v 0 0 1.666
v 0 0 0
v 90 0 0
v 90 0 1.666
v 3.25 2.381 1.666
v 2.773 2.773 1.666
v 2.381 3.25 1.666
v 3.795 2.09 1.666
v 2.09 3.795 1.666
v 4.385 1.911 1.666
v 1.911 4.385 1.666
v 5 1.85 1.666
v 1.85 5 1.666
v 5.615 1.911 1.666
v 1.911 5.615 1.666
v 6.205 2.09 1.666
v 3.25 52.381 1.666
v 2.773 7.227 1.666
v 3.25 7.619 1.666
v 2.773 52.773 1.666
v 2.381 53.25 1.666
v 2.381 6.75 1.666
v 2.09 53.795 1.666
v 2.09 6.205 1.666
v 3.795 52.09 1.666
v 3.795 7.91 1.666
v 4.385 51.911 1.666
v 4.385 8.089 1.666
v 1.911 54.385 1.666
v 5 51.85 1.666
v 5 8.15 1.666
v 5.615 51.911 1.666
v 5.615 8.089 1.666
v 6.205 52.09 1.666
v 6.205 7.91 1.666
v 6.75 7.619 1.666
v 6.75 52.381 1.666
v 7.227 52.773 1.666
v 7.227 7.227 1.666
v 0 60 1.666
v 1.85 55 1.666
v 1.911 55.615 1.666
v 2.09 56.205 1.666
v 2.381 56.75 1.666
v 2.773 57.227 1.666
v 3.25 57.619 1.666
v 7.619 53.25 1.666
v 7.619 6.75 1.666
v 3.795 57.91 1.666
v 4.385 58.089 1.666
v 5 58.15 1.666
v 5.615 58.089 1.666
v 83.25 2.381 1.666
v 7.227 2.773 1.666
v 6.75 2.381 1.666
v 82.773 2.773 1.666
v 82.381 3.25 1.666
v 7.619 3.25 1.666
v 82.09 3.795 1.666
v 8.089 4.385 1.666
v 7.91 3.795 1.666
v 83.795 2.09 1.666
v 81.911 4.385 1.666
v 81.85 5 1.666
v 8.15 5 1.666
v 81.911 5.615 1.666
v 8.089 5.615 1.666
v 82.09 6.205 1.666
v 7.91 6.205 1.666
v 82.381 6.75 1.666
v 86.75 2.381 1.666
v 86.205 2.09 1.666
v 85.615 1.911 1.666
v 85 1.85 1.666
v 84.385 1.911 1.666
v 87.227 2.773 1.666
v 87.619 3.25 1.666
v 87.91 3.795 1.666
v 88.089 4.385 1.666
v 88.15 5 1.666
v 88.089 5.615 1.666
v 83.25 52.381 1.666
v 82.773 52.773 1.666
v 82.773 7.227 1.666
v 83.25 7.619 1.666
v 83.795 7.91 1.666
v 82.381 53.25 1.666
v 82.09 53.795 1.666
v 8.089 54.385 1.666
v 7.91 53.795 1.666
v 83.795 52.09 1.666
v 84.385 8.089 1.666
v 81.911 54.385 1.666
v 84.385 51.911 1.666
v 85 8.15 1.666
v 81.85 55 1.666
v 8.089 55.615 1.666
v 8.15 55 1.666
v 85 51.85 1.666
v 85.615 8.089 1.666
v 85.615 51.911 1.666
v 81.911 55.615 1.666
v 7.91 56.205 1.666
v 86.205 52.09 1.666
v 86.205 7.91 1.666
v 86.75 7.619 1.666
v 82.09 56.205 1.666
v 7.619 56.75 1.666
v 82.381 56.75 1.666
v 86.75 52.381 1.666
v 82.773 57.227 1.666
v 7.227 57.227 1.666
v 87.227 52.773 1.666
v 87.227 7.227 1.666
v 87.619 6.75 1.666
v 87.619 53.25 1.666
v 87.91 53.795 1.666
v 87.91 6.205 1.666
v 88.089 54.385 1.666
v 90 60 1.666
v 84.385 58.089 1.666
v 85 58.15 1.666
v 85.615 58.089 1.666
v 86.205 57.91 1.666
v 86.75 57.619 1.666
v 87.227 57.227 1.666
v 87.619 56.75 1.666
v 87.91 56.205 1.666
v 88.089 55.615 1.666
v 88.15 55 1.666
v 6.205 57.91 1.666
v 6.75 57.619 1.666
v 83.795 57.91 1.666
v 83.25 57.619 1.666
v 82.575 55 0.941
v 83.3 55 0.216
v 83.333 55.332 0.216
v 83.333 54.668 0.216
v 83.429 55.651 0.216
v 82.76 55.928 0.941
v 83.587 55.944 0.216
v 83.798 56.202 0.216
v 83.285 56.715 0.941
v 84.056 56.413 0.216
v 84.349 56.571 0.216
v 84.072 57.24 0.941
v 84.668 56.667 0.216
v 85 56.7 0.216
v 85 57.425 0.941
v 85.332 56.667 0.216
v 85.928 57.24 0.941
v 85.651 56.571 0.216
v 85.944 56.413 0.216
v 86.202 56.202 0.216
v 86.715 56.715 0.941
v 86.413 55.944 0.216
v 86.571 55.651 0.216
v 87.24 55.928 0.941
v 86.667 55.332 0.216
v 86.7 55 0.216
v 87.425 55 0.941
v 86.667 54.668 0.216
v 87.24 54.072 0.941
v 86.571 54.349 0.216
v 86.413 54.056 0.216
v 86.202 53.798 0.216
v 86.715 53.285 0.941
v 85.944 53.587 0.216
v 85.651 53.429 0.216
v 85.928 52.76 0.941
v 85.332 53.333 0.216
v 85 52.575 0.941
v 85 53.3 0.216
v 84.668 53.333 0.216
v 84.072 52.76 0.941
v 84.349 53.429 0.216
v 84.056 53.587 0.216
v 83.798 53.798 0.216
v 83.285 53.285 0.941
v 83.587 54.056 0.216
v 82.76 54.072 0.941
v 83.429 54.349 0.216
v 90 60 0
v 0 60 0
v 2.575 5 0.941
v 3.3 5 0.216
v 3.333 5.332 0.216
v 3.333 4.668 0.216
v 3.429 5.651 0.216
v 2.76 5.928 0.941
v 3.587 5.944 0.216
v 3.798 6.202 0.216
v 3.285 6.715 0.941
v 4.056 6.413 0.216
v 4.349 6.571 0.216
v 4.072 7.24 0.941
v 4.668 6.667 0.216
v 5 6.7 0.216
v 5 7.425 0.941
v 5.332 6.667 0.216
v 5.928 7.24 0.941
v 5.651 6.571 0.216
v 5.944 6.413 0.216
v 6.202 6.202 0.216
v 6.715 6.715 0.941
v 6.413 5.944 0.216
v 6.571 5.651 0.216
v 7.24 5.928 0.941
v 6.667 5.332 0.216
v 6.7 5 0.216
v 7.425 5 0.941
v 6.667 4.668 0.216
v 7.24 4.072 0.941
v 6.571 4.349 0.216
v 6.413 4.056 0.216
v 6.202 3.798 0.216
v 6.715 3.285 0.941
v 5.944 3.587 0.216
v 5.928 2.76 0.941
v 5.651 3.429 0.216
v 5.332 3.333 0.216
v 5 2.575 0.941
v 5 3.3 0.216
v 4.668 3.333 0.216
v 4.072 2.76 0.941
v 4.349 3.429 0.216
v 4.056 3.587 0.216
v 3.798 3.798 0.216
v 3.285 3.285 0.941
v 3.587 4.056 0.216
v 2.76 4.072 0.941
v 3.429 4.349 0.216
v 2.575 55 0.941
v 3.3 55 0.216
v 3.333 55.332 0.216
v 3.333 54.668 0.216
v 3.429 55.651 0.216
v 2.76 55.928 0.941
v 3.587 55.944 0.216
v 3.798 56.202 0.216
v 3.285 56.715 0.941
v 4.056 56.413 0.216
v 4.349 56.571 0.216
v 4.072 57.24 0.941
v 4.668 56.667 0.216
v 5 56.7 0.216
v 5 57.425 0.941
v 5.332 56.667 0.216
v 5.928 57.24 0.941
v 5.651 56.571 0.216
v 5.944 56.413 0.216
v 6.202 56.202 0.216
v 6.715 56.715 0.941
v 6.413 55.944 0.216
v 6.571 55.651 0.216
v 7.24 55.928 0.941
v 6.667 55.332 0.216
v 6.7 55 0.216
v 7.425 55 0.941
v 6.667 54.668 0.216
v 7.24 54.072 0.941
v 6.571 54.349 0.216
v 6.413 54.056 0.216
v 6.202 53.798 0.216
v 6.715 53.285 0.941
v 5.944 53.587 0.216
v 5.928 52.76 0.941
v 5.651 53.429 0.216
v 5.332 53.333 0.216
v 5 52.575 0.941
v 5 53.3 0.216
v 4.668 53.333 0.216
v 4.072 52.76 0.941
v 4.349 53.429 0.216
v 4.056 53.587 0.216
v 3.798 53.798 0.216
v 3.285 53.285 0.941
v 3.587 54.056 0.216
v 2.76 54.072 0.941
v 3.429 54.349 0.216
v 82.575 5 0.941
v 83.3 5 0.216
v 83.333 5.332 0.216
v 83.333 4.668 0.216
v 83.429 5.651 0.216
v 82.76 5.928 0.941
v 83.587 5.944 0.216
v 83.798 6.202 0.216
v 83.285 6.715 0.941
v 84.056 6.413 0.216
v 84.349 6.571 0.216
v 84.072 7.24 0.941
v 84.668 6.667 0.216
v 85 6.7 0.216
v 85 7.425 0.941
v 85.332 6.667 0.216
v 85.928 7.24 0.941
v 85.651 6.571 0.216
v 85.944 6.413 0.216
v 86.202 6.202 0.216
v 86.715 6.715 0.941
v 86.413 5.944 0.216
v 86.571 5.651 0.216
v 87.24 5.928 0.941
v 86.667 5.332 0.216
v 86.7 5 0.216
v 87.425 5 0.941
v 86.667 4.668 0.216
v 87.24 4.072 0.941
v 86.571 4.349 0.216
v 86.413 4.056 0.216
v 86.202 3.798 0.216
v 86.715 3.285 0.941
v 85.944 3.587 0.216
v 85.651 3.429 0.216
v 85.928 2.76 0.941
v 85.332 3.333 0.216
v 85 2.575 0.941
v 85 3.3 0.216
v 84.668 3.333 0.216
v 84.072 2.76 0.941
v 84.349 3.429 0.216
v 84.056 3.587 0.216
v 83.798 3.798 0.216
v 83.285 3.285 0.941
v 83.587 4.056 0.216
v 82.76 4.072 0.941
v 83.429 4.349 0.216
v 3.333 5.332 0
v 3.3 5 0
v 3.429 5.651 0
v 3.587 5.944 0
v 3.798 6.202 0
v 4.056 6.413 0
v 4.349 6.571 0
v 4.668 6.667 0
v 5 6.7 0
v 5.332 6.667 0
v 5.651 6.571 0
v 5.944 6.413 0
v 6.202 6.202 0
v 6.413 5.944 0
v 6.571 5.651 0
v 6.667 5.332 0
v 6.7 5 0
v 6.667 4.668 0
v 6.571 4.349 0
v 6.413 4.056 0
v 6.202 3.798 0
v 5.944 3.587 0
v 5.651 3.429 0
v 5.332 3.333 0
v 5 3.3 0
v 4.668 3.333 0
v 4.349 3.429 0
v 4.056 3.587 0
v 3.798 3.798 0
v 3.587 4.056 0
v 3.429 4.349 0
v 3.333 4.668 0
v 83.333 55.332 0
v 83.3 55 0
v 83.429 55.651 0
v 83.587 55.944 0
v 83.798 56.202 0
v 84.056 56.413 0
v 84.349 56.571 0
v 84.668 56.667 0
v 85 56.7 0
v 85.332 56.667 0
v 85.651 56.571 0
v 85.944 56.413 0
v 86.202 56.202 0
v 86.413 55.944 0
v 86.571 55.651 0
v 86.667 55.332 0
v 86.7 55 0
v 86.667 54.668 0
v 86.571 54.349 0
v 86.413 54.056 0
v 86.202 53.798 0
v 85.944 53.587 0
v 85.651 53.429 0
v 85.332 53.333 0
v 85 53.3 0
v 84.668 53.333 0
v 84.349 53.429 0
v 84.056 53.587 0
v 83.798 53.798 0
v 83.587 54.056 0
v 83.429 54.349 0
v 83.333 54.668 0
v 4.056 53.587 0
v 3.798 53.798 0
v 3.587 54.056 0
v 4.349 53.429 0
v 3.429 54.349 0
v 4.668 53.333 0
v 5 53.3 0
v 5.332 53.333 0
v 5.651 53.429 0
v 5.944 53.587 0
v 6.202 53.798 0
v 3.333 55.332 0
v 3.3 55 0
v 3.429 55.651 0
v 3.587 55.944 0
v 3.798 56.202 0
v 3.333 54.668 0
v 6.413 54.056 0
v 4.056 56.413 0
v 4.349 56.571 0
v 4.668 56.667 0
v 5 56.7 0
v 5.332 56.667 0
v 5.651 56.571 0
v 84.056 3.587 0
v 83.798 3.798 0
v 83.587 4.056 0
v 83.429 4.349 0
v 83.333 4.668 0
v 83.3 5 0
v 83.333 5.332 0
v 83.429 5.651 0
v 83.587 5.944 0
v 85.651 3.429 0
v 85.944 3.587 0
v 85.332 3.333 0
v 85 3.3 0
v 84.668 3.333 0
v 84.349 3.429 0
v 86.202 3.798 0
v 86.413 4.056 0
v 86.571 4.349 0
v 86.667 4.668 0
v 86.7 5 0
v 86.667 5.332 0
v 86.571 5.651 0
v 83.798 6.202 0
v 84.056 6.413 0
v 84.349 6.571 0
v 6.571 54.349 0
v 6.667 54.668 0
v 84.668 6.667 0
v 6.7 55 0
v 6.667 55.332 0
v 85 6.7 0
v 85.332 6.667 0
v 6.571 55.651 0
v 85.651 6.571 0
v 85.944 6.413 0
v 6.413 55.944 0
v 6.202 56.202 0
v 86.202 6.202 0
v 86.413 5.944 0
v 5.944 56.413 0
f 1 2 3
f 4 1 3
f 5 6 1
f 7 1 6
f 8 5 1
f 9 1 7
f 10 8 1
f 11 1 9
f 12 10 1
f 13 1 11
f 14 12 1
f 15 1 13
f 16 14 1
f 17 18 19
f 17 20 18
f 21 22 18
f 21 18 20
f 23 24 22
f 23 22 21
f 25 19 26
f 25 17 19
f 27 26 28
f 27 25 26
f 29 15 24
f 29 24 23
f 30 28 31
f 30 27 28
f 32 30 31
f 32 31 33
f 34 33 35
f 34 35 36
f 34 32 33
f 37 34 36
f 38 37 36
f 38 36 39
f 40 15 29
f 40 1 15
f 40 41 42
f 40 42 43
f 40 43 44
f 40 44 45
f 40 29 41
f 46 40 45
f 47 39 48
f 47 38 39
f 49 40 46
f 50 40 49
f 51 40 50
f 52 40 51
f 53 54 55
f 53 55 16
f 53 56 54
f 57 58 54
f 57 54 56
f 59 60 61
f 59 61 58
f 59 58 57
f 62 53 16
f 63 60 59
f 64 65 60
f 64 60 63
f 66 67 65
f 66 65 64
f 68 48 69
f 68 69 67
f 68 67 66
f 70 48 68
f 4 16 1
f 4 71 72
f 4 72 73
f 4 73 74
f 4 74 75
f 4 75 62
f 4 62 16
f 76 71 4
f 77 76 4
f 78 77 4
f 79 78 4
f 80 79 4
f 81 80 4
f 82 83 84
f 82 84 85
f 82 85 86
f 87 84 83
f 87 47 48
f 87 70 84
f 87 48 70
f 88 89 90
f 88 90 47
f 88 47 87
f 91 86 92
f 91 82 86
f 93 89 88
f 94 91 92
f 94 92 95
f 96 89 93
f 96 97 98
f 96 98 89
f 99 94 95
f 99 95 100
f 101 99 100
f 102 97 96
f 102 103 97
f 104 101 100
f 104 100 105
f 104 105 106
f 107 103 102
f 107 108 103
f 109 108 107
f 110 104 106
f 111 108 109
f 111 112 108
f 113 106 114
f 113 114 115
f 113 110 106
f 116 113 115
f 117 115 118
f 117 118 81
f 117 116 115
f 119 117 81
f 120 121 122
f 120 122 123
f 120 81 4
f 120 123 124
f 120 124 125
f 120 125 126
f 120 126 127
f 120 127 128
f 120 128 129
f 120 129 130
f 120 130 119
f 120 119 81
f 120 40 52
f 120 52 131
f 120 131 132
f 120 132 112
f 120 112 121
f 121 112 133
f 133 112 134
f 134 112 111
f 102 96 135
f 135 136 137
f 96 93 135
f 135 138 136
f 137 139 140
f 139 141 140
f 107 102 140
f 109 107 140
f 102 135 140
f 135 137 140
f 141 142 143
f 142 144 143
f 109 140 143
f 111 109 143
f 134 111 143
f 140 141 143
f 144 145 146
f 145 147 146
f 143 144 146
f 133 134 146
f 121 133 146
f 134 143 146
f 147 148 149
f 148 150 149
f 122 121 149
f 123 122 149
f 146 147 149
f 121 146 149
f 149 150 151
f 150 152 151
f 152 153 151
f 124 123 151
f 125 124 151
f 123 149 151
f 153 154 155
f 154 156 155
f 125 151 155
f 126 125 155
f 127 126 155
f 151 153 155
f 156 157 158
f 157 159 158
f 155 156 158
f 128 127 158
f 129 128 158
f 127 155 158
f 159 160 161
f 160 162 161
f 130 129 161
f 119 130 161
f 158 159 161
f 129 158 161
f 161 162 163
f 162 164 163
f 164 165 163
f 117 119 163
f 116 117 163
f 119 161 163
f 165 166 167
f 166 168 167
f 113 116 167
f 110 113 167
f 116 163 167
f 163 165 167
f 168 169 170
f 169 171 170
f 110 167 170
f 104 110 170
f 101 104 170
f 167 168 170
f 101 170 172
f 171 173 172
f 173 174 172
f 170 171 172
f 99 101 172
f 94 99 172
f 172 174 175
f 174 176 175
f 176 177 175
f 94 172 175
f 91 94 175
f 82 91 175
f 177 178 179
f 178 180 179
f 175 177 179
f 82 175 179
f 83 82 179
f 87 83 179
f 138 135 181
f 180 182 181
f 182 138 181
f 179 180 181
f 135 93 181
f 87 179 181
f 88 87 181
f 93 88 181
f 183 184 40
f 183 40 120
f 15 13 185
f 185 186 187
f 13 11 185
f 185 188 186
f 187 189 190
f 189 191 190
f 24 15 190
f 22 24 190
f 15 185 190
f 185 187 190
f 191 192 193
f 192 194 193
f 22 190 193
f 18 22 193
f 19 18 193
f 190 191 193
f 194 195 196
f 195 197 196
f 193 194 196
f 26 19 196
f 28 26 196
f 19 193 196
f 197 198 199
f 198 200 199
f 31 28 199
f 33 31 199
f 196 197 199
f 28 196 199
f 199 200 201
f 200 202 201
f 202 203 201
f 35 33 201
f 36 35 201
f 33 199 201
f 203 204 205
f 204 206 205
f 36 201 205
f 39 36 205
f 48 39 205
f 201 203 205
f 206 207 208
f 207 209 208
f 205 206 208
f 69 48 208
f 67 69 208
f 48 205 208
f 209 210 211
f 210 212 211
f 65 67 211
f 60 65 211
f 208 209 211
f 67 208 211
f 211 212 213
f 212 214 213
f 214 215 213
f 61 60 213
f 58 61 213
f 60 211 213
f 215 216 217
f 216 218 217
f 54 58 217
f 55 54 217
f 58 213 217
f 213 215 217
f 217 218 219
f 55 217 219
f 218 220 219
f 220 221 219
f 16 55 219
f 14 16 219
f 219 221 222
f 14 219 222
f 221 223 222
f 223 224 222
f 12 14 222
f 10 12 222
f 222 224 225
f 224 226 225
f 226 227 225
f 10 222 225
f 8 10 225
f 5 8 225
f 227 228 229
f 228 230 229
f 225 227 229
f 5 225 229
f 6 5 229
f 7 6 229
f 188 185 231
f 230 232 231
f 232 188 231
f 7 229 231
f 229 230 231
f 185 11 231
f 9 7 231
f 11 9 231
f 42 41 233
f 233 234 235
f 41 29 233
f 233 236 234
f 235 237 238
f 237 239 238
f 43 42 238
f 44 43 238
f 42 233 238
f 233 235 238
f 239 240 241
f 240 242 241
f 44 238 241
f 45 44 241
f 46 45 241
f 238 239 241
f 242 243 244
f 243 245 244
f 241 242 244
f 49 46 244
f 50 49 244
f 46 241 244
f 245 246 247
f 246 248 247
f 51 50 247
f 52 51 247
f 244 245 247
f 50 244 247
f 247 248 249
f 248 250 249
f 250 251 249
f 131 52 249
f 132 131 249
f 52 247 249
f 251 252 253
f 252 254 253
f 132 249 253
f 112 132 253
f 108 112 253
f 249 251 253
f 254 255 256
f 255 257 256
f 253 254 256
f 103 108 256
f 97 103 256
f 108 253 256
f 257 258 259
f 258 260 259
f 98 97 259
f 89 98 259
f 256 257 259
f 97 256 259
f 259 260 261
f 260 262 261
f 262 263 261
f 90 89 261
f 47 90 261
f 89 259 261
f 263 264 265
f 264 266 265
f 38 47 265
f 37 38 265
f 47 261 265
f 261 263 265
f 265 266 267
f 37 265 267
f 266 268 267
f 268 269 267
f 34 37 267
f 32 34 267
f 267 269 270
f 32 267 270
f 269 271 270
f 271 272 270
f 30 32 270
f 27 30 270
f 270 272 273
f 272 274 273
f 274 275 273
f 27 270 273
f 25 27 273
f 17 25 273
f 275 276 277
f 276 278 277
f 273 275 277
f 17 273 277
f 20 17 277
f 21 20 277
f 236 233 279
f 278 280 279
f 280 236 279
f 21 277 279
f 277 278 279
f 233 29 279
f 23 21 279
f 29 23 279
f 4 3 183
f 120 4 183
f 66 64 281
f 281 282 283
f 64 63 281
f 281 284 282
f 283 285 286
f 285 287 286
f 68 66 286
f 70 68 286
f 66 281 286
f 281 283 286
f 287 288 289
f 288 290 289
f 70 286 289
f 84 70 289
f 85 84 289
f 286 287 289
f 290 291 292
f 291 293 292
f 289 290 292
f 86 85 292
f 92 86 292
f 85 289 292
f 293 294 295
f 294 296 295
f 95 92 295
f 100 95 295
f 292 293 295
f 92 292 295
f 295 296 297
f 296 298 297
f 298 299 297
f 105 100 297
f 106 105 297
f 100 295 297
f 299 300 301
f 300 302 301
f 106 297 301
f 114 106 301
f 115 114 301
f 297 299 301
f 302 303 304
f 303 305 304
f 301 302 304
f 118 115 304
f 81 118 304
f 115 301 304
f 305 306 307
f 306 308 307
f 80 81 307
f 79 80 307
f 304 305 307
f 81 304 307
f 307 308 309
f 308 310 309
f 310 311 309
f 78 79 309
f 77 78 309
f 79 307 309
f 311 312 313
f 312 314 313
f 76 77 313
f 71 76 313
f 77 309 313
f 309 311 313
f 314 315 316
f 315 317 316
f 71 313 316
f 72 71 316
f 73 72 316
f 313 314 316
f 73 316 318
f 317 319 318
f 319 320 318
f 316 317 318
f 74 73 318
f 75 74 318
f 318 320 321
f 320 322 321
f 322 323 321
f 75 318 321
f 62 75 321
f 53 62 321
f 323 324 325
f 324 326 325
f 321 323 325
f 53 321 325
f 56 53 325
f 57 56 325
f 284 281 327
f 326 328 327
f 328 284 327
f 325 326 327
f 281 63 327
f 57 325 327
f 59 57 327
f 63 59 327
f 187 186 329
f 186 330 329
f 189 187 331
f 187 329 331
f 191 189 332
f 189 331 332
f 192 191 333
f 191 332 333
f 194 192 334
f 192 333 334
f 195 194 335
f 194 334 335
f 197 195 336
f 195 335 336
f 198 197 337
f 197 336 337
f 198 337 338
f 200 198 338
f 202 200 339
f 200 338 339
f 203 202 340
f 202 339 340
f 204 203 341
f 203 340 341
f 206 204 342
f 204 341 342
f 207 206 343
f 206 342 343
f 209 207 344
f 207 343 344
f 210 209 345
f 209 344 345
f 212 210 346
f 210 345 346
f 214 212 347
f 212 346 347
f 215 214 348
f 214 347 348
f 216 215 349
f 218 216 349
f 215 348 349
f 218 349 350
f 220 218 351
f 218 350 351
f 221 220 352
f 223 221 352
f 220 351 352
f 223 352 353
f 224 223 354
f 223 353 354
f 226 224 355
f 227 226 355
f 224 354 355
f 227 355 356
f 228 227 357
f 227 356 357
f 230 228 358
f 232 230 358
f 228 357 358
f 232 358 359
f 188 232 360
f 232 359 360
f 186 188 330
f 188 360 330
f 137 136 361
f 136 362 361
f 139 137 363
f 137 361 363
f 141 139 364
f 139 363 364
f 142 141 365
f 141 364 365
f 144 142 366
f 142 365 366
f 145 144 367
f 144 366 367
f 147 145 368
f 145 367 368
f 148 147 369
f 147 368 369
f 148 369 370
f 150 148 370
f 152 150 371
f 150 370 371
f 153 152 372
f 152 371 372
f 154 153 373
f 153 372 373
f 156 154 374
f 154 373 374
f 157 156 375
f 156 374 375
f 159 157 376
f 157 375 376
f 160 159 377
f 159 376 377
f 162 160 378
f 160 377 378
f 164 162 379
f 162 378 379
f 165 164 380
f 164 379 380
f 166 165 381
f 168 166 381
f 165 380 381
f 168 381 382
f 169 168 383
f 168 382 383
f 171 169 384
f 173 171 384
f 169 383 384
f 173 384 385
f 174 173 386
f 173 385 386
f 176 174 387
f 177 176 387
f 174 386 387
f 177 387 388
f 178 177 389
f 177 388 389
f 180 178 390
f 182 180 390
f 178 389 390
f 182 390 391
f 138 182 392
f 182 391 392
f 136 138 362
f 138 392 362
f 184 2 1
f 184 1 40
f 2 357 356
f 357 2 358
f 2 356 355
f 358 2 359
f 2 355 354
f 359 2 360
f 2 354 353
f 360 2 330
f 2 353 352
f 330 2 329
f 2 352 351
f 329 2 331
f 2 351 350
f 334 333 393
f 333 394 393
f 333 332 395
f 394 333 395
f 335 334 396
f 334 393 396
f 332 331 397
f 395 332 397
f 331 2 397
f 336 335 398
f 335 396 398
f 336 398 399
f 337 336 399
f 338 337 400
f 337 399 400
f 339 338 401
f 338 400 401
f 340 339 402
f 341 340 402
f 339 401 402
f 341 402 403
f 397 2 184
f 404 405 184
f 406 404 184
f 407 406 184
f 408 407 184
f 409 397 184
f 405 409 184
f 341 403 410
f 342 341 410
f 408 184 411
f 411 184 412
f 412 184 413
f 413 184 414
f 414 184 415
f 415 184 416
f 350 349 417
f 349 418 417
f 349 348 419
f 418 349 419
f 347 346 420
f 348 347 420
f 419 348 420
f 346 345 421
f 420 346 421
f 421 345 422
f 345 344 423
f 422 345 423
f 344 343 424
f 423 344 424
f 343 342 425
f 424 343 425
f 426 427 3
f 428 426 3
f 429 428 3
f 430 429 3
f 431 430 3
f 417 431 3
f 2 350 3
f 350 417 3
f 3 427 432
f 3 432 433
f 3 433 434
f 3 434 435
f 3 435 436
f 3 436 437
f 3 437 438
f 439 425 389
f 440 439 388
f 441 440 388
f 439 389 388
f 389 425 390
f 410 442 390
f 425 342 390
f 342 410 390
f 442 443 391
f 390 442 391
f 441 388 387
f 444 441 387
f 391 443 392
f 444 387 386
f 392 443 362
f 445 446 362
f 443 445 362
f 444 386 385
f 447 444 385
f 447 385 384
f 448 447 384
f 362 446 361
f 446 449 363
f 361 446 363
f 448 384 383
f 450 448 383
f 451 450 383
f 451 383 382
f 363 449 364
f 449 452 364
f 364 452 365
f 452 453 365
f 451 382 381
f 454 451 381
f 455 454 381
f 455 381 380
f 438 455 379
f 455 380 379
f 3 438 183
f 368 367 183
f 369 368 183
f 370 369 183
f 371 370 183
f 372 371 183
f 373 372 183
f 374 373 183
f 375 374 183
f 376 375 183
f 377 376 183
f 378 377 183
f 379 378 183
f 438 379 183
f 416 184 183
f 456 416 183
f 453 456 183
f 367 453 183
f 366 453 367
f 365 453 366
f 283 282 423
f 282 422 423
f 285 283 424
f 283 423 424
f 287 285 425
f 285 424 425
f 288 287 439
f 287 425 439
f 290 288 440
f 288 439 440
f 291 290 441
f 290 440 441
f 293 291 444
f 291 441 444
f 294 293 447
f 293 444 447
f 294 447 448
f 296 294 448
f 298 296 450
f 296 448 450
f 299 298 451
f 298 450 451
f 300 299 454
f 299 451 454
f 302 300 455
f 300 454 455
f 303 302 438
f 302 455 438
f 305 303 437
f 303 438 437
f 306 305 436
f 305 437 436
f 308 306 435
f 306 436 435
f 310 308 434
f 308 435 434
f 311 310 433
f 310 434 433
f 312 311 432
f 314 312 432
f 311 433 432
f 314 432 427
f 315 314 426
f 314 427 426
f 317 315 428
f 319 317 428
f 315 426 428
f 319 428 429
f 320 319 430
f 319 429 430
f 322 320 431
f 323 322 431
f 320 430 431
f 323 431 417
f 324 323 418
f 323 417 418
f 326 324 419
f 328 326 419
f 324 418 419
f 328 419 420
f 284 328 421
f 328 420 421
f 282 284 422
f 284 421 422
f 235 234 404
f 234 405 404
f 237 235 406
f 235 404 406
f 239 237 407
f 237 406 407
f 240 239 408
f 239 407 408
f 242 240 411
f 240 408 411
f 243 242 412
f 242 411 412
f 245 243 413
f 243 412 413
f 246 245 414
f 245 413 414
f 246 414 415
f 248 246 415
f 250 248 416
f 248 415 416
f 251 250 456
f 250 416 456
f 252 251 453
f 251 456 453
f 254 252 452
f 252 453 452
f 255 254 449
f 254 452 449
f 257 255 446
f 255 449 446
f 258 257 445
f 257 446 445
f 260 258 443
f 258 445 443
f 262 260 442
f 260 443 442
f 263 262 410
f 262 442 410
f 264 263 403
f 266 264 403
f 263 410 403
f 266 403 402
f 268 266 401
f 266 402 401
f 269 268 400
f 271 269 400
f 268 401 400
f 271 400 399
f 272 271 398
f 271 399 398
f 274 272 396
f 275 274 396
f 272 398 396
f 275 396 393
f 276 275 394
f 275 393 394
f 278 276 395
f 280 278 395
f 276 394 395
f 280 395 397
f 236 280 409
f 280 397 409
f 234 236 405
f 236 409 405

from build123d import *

# Parameters (mm, degrees)
SKETCH1_W                                           = 90
SKETCH1_H                                           = 60
BOSS_EXTRUDE1_DEPTH                                 = 1.666
CSK_FOR_M3_COUNTERSUNK_FLAT_HEAD_SCREW1_D           = 3.4
CSK_FOR_M3_COUNTERSUNK_FLAT_HEAD_SCREW1_DEPTH       = 30
CSK_FOR_M3_COUNTERSUNK_FLAT_HEAD_SCREW1_CSINK_D     = 6.3
CSK_FOR_M3_COUNTERSUNK_FLAT_HEAD_SCREW1_CSINK_ANGLE = 90
CSK_FOR_M3_COUNTERSUNK_FLAT_HEAD_SCREW1_TIP         = 1.021463052


with BuildPart() as part:
    # Sketch1 → Boss-Extrude1 (new body)
    with BuildSketch(Plane.XY):
        with Locations((45, 30)):
            Rectangle(SKETCH1_W, SKETCH1_H)
    extrude(amount=BOSS_EXTRUDE1_DEPTH)

    # CSK for M3 Countersunk Flat Head Screw1
    with Locations(Plane.XY.offset(1.666)):
        with Locations((5, 55), (5, 5), (85, 5), (85, 55)):
            CounterSinkHole(CSK_FOR_M3_COUNTERSUNK_FLAT_HEAD_SCREW1_D / 2, CSK_FOR_M3_COUNTERSUNK_FLAT_HEAD_SCREW1_CSINK_D / 2, depth=CSK_FOR_M3_COUNTERSUNK_FLAT_HEAD_SCREW1_DEPTH, counter_sink_angle=CSK_FOR_M3_COUNTERSUNK_FLAT_HEAD_SCREW1_CSINK_ANGLE)
            with Locations((0, 0, -(CSK_FOR_M3_COUNTERSUNK_FLAT_HEAD_SCREW1_DEPTH + CSK_FOR_M3_COUNTERSUNK_FLAT_HEAD_SCREW1_TIP / 2))):  # 118° drill point
                Cone(0, CSK_FOR_M3_COUNTERSUNK_FLAT_HEAD_SCREW1_D / 2, CSK_FOR_M3_COUNTERSUNK_FLAT_HEAD_SCREW1_TIP, mode=Mode.SUBTRACT)


solid = part.part
